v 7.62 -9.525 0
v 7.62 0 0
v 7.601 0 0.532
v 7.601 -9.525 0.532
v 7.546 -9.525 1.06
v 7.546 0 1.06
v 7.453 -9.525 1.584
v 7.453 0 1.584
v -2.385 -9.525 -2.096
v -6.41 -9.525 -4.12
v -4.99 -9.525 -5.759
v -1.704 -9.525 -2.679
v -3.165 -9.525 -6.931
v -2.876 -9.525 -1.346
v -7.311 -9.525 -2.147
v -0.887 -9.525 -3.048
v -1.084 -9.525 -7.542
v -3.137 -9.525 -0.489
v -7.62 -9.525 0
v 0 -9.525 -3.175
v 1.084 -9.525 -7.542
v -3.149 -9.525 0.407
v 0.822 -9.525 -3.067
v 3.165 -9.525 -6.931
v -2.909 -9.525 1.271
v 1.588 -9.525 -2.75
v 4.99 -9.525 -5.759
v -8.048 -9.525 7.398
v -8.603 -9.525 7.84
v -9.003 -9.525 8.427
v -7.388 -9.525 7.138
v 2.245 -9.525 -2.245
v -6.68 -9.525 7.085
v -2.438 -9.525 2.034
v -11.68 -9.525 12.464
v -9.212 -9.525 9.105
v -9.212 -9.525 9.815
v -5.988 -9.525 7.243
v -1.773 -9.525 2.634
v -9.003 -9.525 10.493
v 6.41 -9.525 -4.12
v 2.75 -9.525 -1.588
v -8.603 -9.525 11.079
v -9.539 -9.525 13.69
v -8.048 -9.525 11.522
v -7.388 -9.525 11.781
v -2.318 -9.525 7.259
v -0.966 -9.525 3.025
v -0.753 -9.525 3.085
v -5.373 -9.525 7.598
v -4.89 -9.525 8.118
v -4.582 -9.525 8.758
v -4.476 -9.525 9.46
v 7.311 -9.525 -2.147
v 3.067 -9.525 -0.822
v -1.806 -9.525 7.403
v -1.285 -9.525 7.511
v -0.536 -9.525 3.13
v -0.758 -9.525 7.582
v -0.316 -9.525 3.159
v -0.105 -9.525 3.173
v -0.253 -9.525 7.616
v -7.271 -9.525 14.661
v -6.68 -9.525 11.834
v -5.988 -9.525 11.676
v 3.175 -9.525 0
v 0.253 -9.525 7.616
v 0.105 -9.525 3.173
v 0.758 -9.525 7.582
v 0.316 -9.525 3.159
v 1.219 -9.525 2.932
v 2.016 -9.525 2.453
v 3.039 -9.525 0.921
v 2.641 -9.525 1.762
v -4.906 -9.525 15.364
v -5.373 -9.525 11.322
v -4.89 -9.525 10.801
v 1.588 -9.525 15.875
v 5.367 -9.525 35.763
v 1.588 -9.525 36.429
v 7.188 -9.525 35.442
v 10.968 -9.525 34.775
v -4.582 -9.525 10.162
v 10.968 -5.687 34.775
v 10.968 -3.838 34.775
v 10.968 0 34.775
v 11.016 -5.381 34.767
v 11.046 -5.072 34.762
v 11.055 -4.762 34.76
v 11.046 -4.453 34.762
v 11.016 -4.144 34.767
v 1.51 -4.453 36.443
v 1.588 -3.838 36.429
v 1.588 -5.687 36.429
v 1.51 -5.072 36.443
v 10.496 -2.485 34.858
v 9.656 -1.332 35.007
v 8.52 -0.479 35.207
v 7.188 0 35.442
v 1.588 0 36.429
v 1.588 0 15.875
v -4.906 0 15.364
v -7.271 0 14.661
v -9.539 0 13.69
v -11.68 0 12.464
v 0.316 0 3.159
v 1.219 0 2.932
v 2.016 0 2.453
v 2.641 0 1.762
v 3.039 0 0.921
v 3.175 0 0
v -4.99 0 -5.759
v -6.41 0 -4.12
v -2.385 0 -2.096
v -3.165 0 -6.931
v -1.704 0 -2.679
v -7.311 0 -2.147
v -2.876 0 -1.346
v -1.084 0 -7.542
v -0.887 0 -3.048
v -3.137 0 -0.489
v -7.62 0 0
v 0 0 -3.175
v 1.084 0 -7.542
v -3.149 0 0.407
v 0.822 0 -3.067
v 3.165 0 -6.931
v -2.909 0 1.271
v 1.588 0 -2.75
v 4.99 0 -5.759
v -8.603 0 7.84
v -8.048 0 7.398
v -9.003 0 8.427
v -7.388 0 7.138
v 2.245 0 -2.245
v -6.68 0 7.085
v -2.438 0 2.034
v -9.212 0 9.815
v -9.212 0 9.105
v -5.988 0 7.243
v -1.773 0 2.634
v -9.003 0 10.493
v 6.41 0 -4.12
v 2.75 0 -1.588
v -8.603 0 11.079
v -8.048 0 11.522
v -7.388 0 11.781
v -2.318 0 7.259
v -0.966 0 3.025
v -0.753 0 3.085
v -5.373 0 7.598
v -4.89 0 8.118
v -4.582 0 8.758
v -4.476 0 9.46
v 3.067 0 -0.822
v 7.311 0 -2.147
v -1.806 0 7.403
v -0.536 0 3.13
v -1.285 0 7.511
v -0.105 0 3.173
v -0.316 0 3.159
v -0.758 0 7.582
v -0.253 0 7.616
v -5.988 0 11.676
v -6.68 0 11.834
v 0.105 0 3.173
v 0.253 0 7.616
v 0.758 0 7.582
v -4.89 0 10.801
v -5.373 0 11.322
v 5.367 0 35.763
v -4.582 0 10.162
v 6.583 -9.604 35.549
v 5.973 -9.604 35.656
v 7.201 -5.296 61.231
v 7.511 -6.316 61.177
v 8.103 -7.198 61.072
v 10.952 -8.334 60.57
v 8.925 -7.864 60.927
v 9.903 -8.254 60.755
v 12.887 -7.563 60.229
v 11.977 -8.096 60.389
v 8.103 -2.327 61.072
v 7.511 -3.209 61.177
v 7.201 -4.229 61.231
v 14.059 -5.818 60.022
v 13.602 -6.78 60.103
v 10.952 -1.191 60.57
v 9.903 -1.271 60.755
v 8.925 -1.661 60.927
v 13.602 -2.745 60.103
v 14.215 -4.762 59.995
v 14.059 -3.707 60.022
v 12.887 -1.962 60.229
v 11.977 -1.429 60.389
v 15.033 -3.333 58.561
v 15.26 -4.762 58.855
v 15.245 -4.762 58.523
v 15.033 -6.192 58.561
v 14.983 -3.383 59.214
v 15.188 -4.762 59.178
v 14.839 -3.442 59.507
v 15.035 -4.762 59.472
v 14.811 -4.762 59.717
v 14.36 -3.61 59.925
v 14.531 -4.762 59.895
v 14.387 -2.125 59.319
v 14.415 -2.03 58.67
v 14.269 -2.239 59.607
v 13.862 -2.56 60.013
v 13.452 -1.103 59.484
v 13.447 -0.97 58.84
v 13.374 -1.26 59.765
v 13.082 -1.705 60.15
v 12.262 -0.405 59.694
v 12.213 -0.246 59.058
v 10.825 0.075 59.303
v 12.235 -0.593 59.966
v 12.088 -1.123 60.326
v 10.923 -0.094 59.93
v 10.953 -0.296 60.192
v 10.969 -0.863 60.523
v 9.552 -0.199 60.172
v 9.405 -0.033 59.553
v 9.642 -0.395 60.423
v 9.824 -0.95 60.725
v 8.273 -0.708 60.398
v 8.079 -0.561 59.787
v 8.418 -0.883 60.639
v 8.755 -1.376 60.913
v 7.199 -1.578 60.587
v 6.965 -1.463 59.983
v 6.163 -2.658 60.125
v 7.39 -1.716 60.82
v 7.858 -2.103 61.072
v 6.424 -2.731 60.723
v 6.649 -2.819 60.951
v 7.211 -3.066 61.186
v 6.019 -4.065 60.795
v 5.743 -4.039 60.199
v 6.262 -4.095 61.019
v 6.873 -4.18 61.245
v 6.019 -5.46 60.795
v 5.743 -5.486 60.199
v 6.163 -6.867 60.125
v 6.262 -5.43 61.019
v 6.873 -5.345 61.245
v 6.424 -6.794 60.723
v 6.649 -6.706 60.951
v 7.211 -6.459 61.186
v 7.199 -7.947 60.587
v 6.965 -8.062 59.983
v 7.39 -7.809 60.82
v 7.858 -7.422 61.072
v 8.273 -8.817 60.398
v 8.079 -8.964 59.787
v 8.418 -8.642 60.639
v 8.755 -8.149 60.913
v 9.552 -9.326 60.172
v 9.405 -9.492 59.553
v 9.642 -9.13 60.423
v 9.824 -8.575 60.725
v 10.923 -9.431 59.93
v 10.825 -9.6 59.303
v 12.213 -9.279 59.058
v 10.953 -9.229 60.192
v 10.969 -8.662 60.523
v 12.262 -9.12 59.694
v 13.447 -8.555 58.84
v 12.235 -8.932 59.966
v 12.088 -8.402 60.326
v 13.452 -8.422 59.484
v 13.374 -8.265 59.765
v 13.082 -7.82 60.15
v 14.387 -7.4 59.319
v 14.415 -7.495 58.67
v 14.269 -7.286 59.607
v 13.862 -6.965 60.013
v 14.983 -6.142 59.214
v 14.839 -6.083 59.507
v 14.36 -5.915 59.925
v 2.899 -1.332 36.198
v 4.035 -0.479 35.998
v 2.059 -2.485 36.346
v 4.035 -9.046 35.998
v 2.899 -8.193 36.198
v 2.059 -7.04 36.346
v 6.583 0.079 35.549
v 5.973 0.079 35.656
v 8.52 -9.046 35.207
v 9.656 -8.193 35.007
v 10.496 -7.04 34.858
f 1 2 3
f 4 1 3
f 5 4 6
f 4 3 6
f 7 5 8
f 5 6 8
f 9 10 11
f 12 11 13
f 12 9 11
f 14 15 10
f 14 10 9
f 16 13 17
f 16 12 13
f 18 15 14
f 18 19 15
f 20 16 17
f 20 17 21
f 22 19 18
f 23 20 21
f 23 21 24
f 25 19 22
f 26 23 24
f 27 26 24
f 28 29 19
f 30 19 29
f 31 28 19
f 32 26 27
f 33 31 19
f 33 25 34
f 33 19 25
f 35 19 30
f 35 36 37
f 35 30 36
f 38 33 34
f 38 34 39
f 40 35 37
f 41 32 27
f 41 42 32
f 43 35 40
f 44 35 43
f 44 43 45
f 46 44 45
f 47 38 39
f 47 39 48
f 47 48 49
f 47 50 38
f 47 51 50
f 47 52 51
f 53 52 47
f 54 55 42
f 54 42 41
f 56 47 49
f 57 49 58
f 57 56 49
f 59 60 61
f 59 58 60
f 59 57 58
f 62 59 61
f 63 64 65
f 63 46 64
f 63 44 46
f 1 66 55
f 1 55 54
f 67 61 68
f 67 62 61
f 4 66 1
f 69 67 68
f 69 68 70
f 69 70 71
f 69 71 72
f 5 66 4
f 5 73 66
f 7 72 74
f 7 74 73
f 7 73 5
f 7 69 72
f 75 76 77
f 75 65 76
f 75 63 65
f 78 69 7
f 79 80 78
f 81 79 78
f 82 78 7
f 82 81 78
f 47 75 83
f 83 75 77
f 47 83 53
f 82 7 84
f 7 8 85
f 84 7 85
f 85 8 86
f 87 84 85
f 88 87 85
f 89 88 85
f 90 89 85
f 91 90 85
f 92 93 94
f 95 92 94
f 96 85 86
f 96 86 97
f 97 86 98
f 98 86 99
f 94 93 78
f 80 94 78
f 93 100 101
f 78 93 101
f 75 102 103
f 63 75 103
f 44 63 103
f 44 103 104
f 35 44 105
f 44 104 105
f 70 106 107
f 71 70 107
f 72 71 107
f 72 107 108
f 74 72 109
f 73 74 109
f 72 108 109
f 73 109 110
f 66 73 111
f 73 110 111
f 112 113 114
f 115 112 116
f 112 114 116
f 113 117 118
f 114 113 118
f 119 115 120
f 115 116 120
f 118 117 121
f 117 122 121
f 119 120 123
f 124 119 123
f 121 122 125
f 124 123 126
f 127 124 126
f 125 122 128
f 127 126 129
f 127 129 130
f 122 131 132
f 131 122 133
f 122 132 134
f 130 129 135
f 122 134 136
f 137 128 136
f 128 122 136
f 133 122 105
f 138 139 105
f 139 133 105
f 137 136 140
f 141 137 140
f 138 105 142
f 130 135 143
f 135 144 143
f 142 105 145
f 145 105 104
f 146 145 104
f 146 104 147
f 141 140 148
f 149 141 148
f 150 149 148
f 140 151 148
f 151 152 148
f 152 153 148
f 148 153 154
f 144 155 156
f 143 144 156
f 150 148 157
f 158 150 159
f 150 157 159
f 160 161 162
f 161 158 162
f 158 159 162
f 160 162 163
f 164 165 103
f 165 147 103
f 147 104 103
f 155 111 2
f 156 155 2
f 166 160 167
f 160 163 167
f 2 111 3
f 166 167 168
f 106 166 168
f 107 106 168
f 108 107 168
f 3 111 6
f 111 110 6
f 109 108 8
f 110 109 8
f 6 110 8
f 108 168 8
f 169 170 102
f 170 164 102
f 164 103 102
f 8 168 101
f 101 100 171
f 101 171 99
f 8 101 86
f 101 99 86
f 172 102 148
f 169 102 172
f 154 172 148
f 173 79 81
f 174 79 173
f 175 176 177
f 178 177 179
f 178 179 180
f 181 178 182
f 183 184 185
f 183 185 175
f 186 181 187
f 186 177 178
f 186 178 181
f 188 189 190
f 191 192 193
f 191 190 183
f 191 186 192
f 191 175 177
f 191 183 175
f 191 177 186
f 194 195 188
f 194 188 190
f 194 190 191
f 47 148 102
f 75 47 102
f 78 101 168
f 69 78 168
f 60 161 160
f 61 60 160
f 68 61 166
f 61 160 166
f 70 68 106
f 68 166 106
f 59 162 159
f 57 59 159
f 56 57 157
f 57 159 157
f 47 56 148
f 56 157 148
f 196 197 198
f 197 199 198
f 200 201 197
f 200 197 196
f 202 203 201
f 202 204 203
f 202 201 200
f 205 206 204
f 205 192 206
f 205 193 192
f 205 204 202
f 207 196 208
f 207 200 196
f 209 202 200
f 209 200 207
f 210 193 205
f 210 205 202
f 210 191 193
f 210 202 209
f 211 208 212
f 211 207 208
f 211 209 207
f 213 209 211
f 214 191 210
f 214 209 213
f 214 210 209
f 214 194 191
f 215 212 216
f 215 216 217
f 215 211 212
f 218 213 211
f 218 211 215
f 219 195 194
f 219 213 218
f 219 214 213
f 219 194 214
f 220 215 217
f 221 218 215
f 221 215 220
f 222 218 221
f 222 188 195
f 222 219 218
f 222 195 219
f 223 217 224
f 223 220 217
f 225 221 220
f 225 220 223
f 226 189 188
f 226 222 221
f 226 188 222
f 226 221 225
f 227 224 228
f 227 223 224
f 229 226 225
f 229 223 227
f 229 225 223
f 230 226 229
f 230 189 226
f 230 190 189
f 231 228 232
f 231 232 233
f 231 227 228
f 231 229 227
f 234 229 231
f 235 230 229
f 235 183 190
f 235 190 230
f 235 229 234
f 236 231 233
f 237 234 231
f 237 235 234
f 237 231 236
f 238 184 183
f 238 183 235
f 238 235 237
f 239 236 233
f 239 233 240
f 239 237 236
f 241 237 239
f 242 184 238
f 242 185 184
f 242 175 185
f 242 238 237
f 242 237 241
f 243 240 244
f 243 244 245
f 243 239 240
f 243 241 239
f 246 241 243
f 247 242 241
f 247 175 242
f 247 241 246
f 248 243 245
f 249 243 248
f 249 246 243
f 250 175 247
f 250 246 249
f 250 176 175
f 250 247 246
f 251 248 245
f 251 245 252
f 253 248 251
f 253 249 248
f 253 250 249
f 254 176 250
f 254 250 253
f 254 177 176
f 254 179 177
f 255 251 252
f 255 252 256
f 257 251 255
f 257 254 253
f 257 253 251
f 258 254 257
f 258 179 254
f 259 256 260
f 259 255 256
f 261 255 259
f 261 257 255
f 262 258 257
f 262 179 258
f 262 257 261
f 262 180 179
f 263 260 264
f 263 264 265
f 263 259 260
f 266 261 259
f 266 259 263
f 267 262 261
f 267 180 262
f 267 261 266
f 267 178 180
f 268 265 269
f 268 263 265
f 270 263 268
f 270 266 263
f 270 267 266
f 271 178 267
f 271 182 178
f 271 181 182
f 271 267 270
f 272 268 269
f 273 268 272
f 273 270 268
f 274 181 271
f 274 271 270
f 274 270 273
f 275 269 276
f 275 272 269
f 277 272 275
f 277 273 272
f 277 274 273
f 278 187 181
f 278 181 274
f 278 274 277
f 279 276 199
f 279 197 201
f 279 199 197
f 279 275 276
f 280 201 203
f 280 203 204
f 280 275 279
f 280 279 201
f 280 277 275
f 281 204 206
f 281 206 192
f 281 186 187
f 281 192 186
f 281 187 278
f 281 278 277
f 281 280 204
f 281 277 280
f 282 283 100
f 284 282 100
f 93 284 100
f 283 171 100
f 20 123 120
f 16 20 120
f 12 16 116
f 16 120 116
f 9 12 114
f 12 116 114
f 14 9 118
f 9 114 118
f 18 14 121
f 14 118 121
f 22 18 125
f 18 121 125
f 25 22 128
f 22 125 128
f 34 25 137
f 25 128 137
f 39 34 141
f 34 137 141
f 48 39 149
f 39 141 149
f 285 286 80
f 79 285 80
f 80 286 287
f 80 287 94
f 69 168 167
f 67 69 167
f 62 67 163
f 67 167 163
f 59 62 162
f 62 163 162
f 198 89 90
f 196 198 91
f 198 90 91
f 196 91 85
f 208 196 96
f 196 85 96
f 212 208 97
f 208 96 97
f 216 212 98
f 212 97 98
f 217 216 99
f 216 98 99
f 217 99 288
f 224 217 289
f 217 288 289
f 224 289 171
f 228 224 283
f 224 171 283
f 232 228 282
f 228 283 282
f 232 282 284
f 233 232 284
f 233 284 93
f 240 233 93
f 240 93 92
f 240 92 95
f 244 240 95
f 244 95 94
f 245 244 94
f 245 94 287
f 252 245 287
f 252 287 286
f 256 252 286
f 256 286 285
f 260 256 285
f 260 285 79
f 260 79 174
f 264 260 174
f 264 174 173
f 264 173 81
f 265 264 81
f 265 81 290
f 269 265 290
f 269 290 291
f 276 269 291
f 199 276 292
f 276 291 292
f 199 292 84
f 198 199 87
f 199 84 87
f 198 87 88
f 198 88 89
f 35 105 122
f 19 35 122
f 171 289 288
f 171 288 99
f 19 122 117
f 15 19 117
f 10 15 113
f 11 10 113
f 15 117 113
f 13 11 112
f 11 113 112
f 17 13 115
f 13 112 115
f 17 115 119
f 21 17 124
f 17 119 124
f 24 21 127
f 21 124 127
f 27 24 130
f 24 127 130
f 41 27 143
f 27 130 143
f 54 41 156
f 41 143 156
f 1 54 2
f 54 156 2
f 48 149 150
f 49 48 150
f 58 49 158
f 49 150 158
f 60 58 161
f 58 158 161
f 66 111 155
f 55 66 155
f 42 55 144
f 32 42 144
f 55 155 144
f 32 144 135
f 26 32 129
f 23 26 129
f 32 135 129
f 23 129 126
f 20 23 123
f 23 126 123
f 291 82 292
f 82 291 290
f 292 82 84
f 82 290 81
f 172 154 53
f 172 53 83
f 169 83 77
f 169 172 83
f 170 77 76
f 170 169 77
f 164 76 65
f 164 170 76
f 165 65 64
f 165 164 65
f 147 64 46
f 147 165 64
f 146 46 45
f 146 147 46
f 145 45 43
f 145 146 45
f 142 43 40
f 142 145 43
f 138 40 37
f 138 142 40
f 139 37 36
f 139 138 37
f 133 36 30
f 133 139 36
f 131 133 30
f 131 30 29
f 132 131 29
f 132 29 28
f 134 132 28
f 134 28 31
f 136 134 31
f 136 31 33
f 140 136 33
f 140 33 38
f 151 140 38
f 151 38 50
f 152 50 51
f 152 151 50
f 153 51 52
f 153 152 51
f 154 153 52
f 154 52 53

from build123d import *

# Parameters (mm, degrees)
F0_R     = 2.38125
F1_DEPTH = 9.525
F2_R     = 4.8514
F3_DEPTH = 25.4
F4_R     = 1.27
F5_DEPTH = 9.652


with BuildPart() as f1:
    # F0 (on Front) → F1 (new body)
    with BuildSketch(Plane.XZ):
        with BuildLine():
            Line((1.5875, 15.875), (0.7582183389, 7.5821833894))
            ThreePointArc((0.7582183389, 7.5821833894), (5.0844573747, 5.6756227152), (7.4534847176, 1.584287084))
            Line((7.4534847176, 1.584287084), (10.9677938474, 34.7753054223))
            Line((10.9677938474, 34.7753054223), (1.5875, 36.4293043146))
            Line((1.5875, 36.4293043146), (1.5875, 15.875))
        make_face()
        with BuildLine():
            ThreePointArc((0.3159243079, 3.1592430789), (2.354111794, 2.1304418934), (3.175, 0))
            ThreePointArc((3.175, 0), (2.2450640303, -2.2450640303), (0, -3.175))
            ThreePointArc((0, -3.175), (-3.1371548684, -0.4887579481), (-0.965864174, 3.0245216808))
            Line((-0.965864174, 3.0245216808), (-2.3180740176, 7.2588520338))
            ThreePointArc((-2.3180740176, 7.2588520338), (-6.1533780972, 4.4944786119), (-7.62, 0))
            ThreePointArc((-7.62, 0), (0, -7.62), (7.62, 0))
            ThreePointArc((7.62, 0), (7.5782568427, 0.7965068901), (7.4534847176, 1.584287084))
            ThreePointArc((7.4534847176, 1.584287084), (5.0844573747, 5.6756227152), (0.7582183389, 7.5821833894))
            Line((0.7582183389, 7.5821833894), (0.3159243079, 3.1592430789))
        make_face()
        with BuildLine():
            ThreePointArc((-0.3159243079, 3.1592430789), (0, 3.175), (0.3159243079, 3.1592430789))
            Line((0.3159243079, 3.1592430789), (0.7582183389, 7.5821833894))
            ThreePointArc((0.7582183389, 7.5821833894), (0, 7.62), (-0.7582183389, 7.5821833894))
            Line((-0.7582183389, 7.5821833894), (-0.3159243079, 3.1592430789))
        make_face()
        with BuildLine():
            ThreePointArc((-0.965864174, 3.0245216808), (-0.6444244656, 3.1089133324), (-0.3159243079, 3.1592430789))
            Line((-0.3159243079, 3.1592430789), (-0.7582183389, 7.5821833894))
            ThreePointArc((-0.7582183389, 7.5821833894), (-1.5466187175, 7.4613919977), (-2.3180740176, 7.2588520338))
            Line((-2.3180740176, 7.2588520338), (-0.965864174, 3.0245216808))
        make_face()
        with BuildLine():
            ThreePointArc((-7.62, 0), (-6.1533780972, 4.4944786119), (-2.3180740176, 7.2588520338))
            Line((-2.3180740176, 7.2588520338), (-4.9063479519, 15.3638121726))
            ThreePointArc((-4.9063479519, 15.3638121726), (-8.4191710316, 14.2078233352), (-11.6804510943, 12.4641810168))
            Line((-11.6804510943, 12.4641810168), (-7.62, 0))
        make_face()
        with Locations((-6.8576899833, 9.4598067682)):
            Circle(F0_R, mode=Mode.SUBTRACT)
    extrude(amount=F1_DEPTH)

    # F2 (on face) → F3 (join)
    with BuildSketch(Plane(origin=(6.2776469237, 0, 35.6023048685), x_dir=(0.984807753, 0, -0.1736481777), z_dir=(0.1736481777, 0, 0.984807753))):
        with Locations((0, -4.7625)):
            Circle(F2_R)
    extrude(amount=F3_DEPTH)

    # F4
    f4_edges = [f1.edges().sort_by_distance(p)[0] for p in [
        (5.910614, -4.7625, 61.458859),
    ]]
    fillet(f4_edges, radius=F4_R)

    # F0 (on Front) → F5 (cut)
    with BuildSketch(Plane.XZ):
        with Locations((-6.8576899833, 9.4598067682)):
            Circle(F0_R)
    extrude(amount=-F5_DEPTH, mode=Mode.SUBTRACT)


solid = f1.part
